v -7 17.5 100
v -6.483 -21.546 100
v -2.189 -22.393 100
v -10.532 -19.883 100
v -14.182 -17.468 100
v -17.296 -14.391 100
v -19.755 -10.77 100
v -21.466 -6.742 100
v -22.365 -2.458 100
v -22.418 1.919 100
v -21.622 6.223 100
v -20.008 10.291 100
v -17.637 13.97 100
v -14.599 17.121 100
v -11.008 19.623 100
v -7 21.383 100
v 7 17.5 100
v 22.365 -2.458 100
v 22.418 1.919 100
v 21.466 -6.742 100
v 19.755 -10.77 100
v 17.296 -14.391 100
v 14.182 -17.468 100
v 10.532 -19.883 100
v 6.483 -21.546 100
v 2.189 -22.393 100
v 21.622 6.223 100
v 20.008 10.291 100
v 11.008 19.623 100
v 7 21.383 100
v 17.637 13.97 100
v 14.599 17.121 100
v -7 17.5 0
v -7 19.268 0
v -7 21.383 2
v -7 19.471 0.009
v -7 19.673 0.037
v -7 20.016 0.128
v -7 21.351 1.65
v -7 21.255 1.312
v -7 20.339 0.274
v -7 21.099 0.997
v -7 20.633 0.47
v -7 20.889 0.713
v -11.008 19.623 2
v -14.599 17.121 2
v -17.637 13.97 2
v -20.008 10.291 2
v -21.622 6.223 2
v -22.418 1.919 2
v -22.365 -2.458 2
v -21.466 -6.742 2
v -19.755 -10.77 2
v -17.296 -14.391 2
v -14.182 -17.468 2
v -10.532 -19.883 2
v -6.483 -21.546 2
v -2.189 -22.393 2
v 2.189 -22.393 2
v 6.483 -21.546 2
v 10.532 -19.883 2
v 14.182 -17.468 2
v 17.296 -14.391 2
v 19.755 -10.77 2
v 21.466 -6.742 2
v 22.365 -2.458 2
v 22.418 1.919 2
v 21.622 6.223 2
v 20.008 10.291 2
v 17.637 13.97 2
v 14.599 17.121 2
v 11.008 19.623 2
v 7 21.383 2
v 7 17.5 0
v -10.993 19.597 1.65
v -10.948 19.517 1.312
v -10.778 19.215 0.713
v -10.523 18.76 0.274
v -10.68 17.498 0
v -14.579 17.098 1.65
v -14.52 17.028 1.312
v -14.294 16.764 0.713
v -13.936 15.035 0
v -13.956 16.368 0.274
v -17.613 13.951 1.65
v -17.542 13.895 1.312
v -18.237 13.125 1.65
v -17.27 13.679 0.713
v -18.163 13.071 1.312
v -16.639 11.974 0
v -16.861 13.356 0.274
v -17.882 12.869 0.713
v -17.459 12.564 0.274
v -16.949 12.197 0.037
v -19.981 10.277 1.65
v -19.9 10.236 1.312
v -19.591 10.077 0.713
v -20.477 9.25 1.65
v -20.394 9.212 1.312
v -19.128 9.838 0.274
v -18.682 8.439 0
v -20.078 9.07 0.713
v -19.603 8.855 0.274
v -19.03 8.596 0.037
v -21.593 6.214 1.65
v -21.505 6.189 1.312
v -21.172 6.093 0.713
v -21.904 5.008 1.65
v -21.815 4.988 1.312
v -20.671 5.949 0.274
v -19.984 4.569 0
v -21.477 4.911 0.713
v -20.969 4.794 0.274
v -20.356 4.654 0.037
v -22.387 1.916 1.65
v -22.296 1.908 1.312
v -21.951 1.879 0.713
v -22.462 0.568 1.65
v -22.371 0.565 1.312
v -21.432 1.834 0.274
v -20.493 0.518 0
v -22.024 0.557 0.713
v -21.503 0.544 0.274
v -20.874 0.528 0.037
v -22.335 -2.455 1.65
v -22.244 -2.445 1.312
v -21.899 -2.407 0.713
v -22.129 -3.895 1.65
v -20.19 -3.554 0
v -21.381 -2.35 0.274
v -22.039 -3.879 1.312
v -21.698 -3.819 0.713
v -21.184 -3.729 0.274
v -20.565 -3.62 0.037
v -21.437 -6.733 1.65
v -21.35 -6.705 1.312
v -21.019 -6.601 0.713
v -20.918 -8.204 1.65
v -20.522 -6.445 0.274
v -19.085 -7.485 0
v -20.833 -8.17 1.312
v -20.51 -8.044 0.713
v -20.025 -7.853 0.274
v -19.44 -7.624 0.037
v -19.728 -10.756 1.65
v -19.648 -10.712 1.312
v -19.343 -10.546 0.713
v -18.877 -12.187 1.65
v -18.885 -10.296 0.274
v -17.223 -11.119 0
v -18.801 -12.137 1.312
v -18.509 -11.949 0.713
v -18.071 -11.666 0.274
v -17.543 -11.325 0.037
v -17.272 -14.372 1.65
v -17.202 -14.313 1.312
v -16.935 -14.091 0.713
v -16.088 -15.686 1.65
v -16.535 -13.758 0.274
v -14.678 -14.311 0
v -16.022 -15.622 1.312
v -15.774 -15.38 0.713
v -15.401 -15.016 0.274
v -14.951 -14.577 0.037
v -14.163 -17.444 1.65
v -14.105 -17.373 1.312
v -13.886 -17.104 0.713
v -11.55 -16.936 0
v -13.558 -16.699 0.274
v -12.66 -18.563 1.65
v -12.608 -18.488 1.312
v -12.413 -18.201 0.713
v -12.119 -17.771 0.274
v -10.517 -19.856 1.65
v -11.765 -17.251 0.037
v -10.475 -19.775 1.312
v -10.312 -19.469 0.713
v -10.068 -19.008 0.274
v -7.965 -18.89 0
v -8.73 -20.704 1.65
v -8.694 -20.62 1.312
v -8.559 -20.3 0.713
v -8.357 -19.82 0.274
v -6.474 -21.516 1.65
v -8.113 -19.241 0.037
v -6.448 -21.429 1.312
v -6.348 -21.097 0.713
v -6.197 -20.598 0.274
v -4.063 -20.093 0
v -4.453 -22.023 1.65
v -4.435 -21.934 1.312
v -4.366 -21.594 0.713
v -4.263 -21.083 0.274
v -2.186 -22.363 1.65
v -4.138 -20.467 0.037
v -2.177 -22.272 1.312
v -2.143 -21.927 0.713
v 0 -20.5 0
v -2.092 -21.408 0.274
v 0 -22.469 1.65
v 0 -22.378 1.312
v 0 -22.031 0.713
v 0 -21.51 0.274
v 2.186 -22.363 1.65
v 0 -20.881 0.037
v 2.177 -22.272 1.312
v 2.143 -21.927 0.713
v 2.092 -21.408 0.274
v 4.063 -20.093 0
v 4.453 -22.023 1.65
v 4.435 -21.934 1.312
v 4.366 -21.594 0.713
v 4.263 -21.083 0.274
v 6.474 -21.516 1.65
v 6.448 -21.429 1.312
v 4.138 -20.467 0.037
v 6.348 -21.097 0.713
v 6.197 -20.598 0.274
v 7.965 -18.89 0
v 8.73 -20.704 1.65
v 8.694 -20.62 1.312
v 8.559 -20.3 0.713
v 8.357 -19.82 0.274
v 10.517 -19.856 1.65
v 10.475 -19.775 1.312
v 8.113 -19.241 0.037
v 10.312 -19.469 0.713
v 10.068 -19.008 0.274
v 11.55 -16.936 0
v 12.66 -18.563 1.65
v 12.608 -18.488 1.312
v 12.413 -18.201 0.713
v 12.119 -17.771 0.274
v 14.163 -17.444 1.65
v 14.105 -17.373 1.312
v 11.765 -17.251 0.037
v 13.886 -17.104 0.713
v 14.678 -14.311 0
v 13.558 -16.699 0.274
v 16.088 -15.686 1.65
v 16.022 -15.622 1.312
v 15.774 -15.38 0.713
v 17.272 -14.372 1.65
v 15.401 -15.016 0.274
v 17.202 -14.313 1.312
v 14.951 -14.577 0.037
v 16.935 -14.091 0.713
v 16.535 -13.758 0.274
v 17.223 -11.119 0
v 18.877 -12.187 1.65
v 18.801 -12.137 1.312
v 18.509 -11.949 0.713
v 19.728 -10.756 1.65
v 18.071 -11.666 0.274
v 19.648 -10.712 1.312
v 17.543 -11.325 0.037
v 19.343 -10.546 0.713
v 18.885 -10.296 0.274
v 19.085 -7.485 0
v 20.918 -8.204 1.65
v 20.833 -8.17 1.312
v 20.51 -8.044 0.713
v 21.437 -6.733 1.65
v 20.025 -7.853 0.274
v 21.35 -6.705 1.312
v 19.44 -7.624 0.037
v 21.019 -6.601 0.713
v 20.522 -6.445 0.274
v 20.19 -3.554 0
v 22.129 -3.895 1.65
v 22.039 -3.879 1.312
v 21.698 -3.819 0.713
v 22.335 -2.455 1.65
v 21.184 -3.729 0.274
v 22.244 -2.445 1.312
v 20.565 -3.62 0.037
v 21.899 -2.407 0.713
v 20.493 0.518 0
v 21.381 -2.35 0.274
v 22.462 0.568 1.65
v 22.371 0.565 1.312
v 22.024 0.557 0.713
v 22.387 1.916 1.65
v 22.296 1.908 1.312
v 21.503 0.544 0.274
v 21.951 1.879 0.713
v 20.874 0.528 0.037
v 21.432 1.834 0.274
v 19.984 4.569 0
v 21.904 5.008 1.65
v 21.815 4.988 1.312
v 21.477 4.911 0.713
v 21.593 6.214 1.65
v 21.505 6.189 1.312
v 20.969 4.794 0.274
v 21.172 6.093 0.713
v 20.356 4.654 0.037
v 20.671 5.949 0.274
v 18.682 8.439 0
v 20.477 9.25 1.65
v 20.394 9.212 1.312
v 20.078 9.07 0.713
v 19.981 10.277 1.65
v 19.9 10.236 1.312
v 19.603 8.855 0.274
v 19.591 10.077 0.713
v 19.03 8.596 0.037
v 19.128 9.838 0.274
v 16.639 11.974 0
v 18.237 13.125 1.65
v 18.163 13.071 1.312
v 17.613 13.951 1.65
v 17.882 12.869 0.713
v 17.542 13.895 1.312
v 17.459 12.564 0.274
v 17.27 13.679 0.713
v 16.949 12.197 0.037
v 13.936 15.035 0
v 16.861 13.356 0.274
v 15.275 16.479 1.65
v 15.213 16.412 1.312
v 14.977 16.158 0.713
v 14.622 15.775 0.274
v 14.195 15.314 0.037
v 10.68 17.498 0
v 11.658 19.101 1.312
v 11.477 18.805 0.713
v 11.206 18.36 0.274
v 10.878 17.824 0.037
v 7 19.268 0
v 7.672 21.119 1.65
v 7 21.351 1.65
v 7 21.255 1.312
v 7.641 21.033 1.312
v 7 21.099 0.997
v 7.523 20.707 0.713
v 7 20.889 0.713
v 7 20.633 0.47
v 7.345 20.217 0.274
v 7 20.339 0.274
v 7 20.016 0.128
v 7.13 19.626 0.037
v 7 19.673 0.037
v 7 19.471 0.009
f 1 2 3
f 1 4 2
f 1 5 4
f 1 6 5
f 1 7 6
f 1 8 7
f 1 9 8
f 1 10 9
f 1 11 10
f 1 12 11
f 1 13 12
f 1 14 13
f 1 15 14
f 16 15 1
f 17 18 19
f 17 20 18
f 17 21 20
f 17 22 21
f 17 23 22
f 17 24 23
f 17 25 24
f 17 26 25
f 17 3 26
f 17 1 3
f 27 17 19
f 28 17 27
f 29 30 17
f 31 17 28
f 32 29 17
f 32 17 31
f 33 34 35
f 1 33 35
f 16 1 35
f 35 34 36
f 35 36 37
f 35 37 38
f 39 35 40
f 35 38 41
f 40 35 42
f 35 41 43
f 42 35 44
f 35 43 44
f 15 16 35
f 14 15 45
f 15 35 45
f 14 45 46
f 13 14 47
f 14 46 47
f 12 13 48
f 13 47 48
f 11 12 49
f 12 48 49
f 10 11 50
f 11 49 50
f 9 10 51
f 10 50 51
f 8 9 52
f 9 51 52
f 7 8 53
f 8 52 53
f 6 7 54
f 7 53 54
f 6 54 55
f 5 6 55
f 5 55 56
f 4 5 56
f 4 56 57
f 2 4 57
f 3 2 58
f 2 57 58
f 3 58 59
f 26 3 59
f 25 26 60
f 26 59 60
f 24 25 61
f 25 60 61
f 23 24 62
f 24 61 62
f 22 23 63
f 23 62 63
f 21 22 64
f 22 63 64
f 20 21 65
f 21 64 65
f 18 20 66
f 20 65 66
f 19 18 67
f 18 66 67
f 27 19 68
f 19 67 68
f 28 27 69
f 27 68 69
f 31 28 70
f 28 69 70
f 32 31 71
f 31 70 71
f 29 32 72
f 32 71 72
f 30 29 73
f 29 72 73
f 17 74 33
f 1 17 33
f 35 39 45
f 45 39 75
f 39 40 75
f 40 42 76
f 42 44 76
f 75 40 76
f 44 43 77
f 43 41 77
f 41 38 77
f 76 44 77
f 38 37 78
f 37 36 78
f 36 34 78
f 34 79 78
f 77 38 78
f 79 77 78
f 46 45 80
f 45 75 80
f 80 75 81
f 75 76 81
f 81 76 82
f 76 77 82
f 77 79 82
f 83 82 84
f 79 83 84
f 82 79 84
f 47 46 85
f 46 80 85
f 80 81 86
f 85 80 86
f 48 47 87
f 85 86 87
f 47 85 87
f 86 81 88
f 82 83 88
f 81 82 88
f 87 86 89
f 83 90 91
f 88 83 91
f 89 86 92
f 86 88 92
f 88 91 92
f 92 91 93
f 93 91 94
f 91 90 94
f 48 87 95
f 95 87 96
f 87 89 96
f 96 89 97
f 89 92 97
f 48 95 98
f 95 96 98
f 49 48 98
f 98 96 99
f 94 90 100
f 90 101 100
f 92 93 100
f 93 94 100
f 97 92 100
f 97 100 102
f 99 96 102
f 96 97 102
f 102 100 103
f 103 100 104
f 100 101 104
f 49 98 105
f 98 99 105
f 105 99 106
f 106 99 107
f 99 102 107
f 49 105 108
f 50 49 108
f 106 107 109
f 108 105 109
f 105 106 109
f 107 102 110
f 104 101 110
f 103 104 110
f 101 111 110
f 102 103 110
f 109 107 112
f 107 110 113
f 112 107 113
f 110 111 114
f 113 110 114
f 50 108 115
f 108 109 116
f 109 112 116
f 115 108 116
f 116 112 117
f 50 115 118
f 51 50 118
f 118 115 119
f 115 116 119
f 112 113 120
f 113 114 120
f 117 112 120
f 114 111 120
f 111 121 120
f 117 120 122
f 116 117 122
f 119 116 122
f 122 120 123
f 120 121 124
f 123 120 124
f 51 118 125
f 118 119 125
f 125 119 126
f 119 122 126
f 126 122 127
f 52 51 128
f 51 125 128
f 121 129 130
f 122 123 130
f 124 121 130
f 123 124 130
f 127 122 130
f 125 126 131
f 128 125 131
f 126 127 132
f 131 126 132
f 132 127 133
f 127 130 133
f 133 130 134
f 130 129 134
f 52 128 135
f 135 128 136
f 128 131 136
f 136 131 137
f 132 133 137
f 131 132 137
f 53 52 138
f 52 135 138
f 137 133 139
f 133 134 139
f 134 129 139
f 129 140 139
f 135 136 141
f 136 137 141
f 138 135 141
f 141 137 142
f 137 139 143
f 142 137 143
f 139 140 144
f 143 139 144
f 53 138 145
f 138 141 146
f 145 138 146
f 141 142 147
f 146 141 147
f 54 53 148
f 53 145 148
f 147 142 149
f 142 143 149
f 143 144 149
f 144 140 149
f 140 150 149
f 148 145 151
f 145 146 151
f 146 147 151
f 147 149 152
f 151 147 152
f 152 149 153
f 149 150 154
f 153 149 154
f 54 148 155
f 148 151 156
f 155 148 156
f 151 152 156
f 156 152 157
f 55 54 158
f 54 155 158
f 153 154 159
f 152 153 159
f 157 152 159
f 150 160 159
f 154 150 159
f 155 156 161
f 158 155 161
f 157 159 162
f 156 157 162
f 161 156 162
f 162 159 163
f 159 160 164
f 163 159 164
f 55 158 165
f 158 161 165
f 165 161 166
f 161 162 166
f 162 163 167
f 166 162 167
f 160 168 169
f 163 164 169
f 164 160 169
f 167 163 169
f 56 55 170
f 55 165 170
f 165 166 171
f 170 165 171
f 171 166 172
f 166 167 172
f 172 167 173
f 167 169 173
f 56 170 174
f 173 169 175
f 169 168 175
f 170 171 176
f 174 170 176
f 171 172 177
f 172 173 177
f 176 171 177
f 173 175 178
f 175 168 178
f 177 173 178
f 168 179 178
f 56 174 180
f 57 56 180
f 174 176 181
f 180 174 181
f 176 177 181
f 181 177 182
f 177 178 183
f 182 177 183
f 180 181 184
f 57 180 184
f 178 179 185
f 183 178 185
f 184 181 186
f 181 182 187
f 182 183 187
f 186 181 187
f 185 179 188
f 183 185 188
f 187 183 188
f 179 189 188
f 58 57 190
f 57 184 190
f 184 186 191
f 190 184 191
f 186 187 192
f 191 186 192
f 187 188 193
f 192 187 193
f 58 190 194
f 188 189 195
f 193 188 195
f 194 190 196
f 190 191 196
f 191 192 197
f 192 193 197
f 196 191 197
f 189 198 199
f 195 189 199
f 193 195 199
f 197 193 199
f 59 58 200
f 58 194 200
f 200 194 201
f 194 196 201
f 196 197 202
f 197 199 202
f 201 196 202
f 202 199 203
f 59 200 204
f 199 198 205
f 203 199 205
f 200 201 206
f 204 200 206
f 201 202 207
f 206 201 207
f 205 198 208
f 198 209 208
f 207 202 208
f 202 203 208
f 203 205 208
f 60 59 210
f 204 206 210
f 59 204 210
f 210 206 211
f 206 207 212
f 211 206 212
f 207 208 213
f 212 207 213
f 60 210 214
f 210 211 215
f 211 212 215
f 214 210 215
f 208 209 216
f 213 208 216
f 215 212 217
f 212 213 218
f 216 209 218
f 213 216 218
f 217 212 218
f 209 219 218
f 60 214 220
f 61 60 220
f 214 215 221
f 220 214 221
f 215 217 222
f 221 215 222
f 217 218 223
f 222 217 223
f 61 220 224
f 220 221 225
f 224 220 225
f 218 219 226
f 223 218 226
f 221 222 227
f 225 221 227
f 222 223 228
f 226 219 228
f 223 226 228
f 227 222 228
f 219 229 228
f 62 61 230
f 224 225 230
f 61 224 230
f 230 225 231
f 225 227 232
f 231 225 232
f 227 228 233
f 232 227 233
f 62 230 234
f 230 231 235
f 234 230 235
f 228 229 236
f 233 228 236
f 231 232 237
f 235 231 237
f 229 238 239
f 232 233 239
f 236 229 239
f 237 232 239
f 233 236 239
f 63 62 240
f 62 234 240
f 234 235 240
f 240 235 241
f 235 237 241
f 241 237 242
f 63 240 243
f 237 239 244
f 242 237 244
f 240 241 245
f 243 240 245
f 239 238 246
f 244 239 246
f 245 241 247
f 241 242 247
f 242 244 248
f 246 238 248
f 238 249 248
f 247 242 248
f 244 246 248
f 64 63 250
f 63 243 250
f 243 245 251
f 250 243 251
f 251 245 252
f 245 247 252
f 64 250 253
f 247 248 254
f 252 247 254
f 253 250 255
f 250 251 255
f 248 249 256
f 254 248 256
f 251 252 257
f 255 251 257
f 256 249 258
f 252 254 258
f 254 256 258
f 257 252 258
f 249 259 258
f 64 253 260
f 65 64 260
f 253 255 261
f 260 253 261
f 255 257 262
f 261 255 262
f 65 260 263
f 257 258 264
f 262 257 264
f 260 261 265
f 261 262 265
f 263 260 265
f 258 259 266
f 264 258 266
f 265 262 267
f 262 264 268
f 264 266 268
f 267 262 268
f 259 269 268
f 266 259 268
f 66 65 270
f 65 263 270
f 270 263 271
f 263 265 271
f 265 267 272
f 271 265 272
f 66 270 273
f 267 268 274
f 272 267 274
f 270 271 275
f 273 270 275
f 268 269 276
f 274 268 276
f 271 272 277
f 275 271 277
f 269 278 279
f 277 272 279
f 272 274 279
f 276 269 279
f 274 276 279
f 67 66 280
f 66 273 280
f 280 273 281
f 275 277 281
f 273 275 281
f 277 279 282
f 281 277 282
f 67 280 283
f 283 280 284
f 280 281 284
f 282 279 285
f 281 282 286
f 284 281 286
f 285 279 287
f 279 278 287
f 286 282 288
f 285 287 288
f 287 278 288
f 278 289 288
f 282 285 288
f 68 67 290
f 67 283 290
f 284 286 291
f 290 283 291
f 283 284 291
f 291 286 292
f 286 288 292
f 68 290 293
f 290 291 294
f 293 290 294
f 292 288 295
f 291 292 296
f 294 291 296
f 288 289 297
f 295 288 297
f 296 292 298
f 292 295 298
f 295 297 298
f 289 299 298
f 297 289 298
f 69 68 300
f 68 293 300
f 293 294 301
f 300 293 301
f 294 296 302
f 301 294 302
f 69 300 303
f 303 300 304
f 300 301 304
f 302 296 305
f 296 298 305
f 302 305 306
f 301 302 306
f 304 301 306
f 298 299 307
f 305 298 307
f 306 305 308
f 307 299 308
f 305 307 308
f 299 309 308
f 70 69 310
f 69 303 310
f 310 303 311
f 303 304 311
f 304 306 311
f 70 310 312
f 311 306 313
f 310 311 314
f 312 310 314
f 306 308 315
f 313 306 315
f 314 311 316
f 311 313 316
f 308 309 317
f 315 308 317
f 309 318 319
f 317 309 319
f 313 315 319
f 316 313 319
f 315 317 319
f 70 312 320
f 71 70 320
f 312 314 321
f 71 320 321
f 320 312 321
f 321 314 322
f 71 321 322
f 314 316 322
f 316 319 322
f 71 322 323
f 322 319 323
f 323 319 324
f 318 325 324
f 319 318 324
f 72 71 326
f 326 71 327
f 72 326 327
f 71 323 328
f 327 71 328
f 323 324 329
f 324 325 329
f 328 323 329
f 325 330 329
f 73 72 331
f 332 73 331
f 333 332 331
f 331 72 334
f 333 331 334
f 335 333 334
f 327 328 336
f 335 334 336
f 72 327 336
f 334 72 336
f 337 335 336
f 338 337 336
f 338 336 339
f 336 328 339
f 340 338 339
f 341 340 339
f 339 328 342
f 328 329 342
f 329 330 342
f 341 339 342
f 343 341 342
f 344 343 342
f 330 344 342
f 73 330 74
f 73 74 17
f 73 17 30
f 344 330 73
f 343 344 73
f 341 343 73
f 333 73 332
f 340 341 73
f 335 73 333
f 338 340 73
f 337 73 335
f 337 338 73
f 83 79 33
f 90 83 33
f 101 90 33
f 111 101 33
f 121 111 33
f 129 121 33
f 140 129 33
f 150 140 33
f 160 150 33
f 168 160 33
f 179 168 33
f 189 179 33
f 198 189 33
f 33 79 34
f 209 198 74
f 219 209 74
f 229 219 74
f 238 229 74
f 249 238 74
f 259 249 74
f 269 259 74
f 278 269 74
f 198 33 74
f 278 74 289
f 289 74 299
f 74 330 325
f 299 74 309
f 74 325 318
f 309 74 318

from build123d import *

# Parameters (mm, degrees)
SKETCH1_R           = 22.5
BOSS_EXTRUDE3_DEPTH = 100
SKETCH5_W           = 14
SKETCH5_H           = 7.800985848
CUT_EXTRUDE2_DEPTH  = 100
FILLET1_R           = 2


with BuildPart() as part:
    # Sketch1 → Boss-Extrude3 (new body)
    with BuildSketch(Plane.XY):
        Circle(SKETCH1_R)
    extrude(amount=BOSS_EXTRUDE3_DEPTH)

    # Sketch5 → Cut-Extrude2 (cut)
    with BuildSketch(Plane(origin=(0, 0, 0), x_dir=(-1, 0, 0), z_dir=(0, 0, -1))):
        with Locations((0, 21.400492924)):
            Rectangle(SKETCH5_W, SKETCH5_H)
    extrude(amount=-CUT_EXTRUDE2_DEPTH, mode=Mode.SUBTRACT)

    # Fillet1
    fillet1_edges = [part.edges().sort_by_distance(p)[0] for p in [
        (0, -22.5, 0),
    ]]
    fillet(fillet1_edges, radius=FILLET1_R)


solid = part.part
